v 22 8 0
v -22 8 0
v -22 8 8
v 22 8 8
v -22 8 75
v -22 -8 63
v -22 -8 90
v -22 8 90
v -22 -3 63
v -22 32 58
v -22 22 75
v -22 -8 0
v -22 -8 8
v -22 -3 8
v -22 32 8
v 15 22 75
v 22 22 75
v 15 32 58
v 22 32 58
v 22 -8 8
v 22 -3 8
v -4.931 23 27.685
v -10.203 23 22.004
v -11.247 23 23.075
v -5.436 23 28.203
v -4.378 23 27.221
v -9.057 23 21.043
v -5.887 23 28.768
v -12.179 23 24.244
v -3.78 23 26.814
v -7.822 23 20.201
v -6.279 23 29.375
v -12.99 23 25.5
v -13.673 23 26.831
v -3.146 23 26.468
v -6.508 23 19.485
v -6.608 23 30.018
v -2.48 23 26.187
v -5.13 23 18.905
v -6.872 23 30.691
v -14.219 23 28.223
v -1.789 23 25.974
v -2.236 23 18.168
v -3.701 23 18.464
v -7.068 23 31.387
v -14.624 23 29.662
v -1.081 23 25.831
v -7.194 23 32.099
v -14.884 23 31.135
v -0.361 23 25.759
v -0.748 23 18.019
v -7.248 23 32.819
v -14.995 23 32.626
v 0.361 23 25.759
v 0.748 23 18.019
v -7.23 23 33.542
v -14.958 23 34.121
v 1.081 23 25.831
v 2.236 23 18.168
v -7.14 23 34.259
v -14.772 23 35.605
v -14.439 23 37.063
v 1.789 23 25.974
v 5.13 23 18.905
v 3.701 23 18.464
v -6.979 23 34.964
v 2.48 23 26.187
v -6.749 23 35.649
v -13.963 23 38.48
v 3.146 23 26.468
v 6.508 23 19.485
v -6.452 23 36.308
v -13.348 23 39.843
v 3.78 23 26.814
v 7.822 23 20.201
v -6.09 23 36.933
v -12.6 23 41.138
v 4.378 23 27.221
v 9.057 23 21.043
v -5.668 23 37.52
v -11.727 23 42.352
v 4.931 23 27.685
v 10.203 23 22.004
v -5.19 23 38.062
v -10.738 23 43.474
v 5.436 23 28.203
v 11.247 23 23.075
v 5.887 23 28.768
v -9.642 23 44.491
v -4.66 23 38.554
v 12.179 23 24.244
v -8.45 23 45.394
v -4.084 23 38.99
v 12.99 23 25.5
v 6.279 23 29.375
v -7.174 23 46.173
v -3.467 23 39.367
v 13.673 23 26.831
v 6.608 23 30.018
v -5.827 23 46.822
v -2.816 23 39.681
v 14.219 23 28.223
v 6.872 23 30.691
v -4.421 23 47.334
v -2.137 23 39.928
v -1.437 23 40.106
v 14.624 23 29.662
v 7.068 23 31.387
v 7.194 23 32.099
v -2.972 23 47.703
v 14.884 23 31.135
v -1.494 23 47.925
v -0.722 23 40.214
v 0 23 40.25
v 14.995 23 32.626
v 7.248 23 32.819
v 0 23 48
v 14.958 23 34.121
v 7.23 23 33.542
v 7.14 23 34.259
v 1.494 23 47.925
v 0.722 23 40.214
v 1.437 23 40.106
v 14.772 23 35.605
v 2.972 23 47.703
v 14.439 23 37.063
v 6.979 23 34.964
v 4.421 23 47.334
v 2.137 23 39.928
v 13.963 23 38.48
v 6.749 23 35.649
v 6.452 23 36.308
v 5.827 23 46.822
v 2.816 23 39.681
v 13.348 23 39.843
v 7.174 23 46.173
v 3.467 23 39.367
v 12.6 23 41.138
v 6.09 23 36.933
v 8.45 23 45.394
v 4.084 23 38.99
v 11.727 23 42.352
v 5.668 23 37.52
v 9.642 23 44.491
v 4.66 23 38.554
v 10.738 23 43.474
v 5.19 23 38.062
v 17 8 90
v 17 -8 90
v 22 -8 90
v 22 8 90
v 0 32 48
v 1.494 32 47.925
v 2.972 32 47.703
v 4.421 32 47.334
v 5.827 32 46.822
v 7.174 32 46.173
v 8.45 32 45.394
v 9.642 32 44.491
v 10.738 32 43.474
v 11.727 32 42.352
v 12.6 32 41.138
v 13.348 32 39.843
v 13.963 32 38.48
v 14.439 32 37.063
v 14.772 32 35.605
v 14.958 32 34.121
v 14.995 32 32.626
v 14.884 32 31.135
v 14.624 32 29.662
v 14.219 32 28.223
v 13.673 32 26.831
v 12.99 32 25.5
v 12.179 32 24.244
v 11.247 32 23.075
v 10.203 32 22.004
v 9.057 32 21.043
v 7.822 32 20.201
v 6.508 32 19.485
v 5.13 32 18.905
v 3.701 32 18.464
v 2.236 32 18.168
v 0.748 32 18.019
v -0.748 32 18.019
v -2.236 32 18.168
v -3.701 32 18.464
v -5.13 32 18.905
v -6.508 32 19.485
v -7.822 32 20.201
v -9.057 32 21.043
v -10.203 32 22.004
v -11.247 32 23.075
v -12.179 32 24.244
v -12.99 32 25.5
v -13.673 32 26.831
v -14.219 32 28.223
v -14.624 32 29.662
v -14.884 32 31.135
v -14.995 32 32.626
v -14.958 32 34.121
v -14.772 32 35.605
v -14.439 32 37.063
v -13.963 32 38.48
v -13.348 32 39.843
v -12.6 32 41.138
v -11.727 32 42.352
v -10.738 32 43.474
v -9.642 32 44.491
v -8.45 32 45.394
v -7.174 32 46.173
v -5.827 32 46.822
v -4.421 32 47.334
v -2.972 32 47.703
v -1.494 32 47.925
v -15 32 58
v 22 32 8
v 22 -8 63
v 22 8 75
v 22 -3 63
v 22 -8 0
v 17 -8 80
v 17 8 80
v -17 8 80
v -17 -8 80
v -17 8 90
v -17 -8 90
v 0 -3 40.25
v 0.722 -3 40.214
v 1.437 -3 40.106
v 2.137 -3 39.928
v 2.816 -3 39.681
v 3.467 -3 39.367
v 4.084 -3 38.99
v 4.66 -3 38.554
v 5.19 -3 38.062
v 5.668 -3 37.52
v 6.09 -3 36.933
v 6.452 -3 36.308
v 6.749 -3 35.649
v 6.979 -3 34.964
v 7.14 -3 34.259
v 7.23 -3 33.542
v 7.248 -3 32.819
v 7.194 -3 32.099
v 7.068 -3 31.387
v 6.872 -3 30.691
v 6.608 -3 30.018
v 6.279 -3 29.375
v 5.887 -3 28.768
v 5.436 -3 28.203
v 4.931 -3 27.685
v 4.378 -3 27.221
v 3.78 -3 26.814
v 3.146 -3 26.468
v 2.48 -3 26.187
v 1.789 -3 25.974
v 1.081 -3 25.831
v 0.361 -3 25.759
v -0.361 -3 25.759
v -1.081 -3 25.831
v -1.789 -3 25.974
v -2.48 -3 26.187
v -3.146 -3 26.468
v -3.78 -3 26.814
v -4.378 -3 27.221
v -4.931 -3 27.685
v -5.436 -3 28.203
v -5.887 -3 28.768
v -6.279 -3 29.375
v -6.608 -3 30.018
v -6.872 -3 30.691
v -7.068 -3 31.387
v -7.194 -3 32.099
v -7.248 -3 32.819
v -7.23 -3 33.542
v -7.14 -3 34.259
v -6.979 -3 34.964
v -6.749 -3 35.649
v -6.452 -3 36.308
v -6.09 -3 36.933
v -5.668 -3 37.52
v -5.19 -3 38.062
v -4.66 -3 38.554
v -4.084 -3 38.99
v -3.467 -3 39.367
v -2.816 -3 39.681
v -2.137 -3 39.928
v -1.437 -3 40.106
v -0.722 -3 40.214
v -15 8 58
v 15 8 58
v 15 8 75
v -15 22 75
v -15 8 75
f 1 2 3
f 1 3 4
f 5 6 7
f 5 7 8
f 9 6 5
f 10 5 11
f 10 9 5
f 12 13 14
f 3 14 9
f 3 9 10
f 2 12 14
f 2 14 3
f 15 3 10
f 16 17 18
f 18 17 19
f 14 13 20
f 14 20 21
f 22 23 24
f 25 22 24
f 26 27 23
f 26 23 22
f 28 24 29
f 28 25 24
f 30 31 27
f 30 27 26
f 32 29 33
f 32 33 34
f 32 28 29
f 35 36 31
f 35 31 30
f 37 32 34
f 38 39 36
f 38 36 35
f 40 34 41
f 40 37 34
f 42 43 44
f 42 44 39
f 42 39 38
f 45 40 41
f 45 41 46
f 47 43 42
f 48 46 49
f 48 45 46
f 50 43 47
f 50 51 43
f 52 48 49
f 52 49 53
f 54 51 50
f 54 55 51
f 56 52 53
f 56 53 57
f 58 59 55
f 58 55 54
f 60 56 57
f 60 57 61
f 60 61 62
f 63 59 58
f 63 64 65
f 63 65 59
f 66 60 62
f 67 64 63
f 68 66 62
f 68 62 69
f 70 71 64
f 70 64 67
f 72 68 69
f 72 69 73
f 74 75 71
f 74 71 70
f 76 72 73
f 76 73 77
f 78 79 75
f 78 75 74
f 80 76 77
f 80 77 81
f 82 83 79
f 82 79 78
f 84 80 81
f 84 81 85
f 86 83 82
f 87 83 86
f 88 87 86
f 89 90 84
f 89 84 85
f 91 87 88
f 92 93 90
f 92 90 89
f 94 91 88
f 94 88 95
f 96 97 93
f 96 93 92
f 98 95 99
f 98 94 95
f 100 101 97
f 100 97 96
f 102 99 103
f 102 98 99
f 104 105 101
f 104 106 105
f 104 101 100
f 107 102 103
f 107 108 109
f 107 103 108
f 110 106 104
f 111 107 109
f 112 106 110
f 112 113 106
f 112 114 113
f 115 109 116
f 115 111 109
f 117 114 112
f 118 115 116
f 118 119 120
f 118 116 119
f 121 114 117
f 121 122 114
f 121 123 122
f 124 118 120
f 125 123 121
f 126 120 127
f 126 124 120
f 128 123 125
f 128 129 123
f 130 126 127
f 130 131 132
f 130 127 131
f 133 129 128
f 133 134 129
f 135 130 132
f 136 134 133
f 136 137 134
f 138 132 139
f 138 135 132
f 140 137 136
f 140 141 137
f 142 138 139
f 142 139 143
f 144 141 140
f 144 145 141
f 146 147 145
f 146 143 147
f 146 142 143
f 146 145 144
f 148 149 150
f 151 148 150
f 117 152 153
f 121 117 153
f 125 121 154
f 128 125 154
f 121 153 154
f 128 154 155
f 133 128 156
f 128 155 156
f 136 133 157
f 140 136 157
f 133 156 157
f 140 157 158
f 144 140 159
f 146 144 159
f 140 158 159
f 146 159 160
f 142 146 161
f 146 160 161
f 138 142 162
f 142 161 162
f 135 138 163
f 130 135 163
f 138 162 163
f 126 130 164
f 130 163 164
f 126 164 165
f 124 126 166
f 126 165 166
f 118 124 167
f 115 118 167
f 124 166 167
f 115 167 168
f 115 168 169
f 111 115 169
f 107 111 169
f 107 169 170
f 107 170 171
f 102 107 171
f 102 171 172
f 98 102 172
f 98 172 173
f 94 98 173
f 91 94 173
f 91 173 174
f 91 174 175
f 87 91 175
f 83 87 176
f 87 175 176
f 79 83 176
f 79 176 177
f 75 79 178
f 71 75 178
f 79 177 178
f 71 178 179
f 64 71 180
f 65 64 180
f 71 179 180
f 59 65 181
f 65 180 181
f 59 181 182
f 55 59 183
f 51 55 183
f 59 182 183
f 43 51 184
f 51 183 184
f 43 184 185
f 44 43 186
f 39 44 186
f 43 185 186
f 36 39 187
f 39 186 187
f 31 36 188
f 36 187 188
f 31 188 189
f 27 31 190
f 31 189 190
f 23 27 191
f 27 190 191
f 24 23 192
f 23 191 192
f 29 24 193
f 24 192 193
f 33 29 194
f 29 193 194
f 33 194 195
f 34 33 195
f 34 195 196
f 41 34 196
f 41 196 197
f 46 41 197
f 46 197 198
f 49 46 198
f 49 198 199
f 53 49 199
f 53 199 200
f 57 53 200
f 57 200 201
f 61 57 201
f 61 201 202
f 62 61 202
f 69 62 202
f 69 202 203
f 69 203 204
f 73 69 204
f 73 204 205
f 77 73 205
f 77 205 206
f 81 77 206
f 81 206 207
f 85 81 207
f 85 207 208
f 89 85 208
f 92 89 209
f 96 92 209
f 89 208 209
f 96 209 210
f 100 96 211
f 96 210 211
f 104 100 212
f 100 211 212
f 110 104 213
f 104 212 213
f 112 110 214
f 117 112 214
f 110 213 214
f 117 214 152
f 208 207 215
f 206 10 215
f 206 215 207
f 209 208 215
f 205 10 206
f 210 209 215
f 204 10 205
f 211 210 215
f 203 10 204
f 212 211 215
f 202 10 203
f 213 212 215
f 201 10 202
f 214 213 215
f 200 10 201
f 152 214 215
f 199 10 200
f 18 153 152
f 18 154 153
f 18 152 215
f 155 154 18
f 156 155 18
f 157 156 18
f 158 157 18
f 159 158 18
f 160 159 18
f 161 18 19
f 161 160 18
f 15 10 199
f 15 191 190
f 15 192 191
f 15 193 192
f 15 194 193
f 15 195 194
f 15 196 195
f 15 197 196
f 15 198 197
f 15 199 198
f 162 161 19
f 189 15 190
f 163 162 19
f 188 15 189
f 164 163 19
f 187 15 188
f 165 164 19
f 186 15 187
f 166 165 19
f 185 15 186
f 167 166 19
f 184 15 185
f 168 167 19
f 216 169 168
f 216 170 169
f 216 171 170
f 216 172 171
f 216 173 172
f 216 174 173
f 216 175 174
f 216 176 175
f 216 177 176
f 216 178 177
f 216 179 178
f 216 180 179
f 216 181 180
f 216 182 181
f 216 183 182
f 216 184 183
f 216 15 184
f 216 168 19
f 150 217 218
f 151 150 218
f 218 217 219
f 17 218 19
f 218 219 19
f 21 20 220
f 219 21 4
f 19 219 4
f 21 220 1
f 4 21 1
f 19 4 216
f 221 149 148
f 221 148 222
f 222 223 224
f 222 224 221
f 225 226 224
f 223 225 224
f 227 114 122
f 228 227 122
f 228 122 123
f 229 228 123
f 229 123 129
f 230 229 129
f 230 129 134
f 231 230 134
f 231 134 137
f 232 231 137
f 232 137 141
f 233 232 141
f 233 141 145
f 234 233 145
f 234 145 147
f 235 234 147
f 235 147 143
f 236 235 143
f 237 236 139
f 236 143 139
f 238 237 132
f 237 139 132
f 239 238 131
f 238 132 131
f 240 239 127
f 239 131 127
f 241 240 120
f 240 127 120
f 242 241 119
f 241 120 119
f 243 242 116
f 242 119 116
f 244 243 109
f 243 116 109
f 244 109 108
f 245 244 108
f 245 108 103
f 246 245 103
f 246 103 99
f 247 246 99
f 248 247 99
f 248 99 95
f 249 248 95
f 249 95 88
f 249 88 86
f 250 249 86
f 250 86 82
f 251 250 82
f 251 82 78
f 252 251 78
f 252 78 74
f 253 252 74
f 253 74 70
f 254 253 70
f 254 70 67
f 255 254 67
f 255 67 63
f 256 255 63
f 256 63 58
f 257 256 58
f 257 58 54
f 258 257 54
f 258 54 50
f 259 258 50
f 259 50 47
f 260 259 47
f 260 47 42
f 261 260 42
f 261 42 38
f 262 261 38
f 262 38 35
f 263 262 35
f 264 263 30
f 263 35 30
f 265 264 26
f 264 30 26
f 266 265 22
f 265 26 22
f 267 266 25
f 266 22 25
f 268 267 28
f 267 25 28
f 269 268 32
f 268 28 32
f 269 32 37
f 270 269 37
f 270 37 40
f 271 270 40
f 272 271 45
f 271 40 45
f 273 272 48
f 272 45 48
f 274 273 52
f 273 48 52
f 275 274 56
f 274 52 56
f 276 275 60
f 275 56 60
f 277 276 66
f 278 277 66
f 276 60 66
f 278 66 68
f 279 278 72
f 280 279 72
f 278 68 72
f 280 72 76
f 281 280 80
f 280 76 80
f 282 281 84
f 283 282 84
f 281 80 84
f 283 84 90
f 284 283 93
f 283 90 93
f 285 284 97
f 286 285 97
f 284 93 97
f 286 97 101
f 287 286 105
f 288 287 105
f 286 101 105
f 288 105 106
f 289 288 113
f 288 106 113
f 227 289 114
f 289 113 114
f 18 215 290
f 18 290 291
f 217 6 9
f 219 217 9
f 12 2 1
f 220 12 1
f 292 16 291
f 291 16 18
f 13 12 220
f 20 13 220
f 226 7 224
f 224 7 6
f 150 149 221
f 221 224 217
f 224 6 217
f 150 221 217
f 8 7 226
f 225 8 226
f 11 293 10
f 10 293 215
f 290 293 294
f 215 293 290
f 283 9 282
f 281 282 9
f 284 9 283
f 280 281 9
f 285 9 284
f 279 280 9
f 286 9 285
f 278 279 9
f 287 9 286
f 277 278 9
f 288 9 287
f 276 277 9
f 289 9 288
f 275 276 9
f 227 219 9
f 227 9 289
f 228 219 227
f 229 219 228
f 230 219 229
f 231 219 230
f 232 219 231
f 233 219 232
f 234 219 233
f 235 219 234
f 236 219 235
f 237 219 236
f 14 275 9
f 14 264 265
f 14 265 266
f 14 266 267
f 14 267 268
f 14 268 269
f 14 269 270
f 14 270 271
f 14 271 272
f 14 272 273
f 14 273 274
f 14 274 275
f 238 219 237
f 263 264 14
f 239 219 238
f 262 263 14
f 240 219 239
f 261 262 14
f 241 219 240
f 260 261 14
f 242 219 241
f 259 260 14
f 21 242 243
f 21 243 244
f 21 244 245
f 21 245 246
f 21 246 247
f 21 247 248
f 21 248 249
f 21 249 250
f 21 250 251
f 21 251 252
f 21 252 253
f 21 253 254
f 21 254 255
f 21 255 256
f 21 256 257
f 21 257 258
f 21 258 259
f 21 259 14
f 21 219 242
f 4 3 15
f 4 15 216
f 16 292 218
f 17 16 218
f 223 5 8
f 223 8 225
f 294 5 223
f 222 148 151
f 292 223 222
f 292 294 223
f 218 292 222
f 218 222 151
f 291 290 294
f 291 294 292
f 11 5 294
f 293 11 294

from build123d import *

# Parameters (mm, degrees)
SKETCH_1_W          = 44
SKETCH_1_H          = 16
EXTRUDE_1_DEPTH     = 90
SKETCH_2_W          = 55
SKETCH_2_H          = 5
CUT_EXTRUDE_1_DEPTH = 101.498756211
SKETCH_3_W          = 34
SKETCH_3_H          = 10
CUT_EXTRUDE_2_DEPTH = 95.021274188
SKETCH_4_W          = 44
SKETCH_4_H          = 67
EXTRUDE_2_DEPTH     = 24
SKETCH_5_W          = 30
SKETCH_5_H          = 17
CUT_EXTRUDE_3_DEPTH = 24
CUT_EXTRUDE_4_DEPTH = 106.166534601
SKETCH_7_R          = 15
CUT_EXTRUDE_5_DEPTH = 9
SKETCH_8_R          = 7.25
CUT_EXTRUDE_6_DEPTH = 98.698515854


with BuildPart() as part:
    # Эскиз1 → Бобышка-Вытянуть1 (new body)
    with BuildSketch(Plane.XY):
        Rectangle(SKETCH_1_W, SKETCH_1_H)
    extrude(amount=EXTRUDE_1_DEPTH)

    # Эскиз2 → Вырез-Вытянуть1 (cut, through all)
    with BuildSketch(Plane(origin=(22, 0, 0), x_dir=(0, 0, -1), z_dir=(1, 0, 0))):
        with Locations((-35.5, -5.5)):
            Rectangle(SKETCH_2_W, SKETCH_2_H)
    extrude(amount=-CUT_EXTRUDE_1_DEPTH, mode=Mode.SUBTRACT)

    # Эскиз3 → Вырез-Вытянуть2 (cut, through all)
    with BuildSketch(Plane(origin=(0, 8, 0), x_dir=(1, 0, 0), z_dir=(0, 1, 0))):
        with Locations((0, -85)):
            Rectangle(SKETCH_3_W, SKETCH_3_H)
    extrude(amount=-CUT_EXTRUDE_2_DEPTH, mode=Mode.SUBTRACT)

    # Эскиз4 → Бобышка-Вытянуть2 (add)
    with BuildSketch(Plane(origin=(0, 8, 0), x_dir=(1, 0, 0), z_dir=(0, 1, 0))):
        with Locations((0, -41.5)):
            Rectangle(SKETCH_4_W, SKETCH_4_H)
    extrude(amount=EXTRUDE_2_DEPTH)

    # Эскиз5 → Вырез-Вытянуть3 (cut)
    with BuildSketch(Plane(origin=(0, 32, 0), x_dir=(1, 0, 0), z_dir=(0, 1, 0))):
        with Locations((0, -66.5)):
            Rectangle(SKETCH_5_W, SKETCH_5_H)
    extrude(amount=-CUT_EXTRUDE_3_DEPTH, mode=Mode.SUBTRACT)

    # Эскиз6 → Вырез-Вытянуть4 (cut, through all)
    with BuildSketch(Plane(origin=(22, 0, 0), x_dir=(0, 0, -1), z_dir=(1, 0, 0))):
        Polygon((-75, 22), (-58, 32), (-75, 32), align=None)
    extrude(amount=-CUT_EXTRUDE_4_DEPTH, mode=Mode.SUBTRACT)

    # Эскиз7 → Вырез-Вытянуть5 (cut)
    with BuildSketch(Plane(origin=(0, 32, 0), x_dir=(1, 0, 0), z_dir=(0, 1, 0))):
        with Locations(Location((0, -33, 0), (0, 0, 270))):
            Circle(SKETCH_7_R)
    extrude(amount=-CUT_EXTRUDE_5_DEPTH, mode=Mode.SUBTRACT)

    # Эскиз8 → Вырез-Вытянуть6 (cut, through all)
    with BuildSketch(Plane(origin=(0, 23, 0), x_dir=(1, 0, 0), z_dir=(0, 1, 0))):
        with Locations(Location((0, -33, 0), (0, 0, 270))):
            Circle(SKETCH_8_R)
    extrude(amount=-CUT_EXTRUDE_6_DEPTH, mode=Mode.SUBTRACT)


solid = part.part
